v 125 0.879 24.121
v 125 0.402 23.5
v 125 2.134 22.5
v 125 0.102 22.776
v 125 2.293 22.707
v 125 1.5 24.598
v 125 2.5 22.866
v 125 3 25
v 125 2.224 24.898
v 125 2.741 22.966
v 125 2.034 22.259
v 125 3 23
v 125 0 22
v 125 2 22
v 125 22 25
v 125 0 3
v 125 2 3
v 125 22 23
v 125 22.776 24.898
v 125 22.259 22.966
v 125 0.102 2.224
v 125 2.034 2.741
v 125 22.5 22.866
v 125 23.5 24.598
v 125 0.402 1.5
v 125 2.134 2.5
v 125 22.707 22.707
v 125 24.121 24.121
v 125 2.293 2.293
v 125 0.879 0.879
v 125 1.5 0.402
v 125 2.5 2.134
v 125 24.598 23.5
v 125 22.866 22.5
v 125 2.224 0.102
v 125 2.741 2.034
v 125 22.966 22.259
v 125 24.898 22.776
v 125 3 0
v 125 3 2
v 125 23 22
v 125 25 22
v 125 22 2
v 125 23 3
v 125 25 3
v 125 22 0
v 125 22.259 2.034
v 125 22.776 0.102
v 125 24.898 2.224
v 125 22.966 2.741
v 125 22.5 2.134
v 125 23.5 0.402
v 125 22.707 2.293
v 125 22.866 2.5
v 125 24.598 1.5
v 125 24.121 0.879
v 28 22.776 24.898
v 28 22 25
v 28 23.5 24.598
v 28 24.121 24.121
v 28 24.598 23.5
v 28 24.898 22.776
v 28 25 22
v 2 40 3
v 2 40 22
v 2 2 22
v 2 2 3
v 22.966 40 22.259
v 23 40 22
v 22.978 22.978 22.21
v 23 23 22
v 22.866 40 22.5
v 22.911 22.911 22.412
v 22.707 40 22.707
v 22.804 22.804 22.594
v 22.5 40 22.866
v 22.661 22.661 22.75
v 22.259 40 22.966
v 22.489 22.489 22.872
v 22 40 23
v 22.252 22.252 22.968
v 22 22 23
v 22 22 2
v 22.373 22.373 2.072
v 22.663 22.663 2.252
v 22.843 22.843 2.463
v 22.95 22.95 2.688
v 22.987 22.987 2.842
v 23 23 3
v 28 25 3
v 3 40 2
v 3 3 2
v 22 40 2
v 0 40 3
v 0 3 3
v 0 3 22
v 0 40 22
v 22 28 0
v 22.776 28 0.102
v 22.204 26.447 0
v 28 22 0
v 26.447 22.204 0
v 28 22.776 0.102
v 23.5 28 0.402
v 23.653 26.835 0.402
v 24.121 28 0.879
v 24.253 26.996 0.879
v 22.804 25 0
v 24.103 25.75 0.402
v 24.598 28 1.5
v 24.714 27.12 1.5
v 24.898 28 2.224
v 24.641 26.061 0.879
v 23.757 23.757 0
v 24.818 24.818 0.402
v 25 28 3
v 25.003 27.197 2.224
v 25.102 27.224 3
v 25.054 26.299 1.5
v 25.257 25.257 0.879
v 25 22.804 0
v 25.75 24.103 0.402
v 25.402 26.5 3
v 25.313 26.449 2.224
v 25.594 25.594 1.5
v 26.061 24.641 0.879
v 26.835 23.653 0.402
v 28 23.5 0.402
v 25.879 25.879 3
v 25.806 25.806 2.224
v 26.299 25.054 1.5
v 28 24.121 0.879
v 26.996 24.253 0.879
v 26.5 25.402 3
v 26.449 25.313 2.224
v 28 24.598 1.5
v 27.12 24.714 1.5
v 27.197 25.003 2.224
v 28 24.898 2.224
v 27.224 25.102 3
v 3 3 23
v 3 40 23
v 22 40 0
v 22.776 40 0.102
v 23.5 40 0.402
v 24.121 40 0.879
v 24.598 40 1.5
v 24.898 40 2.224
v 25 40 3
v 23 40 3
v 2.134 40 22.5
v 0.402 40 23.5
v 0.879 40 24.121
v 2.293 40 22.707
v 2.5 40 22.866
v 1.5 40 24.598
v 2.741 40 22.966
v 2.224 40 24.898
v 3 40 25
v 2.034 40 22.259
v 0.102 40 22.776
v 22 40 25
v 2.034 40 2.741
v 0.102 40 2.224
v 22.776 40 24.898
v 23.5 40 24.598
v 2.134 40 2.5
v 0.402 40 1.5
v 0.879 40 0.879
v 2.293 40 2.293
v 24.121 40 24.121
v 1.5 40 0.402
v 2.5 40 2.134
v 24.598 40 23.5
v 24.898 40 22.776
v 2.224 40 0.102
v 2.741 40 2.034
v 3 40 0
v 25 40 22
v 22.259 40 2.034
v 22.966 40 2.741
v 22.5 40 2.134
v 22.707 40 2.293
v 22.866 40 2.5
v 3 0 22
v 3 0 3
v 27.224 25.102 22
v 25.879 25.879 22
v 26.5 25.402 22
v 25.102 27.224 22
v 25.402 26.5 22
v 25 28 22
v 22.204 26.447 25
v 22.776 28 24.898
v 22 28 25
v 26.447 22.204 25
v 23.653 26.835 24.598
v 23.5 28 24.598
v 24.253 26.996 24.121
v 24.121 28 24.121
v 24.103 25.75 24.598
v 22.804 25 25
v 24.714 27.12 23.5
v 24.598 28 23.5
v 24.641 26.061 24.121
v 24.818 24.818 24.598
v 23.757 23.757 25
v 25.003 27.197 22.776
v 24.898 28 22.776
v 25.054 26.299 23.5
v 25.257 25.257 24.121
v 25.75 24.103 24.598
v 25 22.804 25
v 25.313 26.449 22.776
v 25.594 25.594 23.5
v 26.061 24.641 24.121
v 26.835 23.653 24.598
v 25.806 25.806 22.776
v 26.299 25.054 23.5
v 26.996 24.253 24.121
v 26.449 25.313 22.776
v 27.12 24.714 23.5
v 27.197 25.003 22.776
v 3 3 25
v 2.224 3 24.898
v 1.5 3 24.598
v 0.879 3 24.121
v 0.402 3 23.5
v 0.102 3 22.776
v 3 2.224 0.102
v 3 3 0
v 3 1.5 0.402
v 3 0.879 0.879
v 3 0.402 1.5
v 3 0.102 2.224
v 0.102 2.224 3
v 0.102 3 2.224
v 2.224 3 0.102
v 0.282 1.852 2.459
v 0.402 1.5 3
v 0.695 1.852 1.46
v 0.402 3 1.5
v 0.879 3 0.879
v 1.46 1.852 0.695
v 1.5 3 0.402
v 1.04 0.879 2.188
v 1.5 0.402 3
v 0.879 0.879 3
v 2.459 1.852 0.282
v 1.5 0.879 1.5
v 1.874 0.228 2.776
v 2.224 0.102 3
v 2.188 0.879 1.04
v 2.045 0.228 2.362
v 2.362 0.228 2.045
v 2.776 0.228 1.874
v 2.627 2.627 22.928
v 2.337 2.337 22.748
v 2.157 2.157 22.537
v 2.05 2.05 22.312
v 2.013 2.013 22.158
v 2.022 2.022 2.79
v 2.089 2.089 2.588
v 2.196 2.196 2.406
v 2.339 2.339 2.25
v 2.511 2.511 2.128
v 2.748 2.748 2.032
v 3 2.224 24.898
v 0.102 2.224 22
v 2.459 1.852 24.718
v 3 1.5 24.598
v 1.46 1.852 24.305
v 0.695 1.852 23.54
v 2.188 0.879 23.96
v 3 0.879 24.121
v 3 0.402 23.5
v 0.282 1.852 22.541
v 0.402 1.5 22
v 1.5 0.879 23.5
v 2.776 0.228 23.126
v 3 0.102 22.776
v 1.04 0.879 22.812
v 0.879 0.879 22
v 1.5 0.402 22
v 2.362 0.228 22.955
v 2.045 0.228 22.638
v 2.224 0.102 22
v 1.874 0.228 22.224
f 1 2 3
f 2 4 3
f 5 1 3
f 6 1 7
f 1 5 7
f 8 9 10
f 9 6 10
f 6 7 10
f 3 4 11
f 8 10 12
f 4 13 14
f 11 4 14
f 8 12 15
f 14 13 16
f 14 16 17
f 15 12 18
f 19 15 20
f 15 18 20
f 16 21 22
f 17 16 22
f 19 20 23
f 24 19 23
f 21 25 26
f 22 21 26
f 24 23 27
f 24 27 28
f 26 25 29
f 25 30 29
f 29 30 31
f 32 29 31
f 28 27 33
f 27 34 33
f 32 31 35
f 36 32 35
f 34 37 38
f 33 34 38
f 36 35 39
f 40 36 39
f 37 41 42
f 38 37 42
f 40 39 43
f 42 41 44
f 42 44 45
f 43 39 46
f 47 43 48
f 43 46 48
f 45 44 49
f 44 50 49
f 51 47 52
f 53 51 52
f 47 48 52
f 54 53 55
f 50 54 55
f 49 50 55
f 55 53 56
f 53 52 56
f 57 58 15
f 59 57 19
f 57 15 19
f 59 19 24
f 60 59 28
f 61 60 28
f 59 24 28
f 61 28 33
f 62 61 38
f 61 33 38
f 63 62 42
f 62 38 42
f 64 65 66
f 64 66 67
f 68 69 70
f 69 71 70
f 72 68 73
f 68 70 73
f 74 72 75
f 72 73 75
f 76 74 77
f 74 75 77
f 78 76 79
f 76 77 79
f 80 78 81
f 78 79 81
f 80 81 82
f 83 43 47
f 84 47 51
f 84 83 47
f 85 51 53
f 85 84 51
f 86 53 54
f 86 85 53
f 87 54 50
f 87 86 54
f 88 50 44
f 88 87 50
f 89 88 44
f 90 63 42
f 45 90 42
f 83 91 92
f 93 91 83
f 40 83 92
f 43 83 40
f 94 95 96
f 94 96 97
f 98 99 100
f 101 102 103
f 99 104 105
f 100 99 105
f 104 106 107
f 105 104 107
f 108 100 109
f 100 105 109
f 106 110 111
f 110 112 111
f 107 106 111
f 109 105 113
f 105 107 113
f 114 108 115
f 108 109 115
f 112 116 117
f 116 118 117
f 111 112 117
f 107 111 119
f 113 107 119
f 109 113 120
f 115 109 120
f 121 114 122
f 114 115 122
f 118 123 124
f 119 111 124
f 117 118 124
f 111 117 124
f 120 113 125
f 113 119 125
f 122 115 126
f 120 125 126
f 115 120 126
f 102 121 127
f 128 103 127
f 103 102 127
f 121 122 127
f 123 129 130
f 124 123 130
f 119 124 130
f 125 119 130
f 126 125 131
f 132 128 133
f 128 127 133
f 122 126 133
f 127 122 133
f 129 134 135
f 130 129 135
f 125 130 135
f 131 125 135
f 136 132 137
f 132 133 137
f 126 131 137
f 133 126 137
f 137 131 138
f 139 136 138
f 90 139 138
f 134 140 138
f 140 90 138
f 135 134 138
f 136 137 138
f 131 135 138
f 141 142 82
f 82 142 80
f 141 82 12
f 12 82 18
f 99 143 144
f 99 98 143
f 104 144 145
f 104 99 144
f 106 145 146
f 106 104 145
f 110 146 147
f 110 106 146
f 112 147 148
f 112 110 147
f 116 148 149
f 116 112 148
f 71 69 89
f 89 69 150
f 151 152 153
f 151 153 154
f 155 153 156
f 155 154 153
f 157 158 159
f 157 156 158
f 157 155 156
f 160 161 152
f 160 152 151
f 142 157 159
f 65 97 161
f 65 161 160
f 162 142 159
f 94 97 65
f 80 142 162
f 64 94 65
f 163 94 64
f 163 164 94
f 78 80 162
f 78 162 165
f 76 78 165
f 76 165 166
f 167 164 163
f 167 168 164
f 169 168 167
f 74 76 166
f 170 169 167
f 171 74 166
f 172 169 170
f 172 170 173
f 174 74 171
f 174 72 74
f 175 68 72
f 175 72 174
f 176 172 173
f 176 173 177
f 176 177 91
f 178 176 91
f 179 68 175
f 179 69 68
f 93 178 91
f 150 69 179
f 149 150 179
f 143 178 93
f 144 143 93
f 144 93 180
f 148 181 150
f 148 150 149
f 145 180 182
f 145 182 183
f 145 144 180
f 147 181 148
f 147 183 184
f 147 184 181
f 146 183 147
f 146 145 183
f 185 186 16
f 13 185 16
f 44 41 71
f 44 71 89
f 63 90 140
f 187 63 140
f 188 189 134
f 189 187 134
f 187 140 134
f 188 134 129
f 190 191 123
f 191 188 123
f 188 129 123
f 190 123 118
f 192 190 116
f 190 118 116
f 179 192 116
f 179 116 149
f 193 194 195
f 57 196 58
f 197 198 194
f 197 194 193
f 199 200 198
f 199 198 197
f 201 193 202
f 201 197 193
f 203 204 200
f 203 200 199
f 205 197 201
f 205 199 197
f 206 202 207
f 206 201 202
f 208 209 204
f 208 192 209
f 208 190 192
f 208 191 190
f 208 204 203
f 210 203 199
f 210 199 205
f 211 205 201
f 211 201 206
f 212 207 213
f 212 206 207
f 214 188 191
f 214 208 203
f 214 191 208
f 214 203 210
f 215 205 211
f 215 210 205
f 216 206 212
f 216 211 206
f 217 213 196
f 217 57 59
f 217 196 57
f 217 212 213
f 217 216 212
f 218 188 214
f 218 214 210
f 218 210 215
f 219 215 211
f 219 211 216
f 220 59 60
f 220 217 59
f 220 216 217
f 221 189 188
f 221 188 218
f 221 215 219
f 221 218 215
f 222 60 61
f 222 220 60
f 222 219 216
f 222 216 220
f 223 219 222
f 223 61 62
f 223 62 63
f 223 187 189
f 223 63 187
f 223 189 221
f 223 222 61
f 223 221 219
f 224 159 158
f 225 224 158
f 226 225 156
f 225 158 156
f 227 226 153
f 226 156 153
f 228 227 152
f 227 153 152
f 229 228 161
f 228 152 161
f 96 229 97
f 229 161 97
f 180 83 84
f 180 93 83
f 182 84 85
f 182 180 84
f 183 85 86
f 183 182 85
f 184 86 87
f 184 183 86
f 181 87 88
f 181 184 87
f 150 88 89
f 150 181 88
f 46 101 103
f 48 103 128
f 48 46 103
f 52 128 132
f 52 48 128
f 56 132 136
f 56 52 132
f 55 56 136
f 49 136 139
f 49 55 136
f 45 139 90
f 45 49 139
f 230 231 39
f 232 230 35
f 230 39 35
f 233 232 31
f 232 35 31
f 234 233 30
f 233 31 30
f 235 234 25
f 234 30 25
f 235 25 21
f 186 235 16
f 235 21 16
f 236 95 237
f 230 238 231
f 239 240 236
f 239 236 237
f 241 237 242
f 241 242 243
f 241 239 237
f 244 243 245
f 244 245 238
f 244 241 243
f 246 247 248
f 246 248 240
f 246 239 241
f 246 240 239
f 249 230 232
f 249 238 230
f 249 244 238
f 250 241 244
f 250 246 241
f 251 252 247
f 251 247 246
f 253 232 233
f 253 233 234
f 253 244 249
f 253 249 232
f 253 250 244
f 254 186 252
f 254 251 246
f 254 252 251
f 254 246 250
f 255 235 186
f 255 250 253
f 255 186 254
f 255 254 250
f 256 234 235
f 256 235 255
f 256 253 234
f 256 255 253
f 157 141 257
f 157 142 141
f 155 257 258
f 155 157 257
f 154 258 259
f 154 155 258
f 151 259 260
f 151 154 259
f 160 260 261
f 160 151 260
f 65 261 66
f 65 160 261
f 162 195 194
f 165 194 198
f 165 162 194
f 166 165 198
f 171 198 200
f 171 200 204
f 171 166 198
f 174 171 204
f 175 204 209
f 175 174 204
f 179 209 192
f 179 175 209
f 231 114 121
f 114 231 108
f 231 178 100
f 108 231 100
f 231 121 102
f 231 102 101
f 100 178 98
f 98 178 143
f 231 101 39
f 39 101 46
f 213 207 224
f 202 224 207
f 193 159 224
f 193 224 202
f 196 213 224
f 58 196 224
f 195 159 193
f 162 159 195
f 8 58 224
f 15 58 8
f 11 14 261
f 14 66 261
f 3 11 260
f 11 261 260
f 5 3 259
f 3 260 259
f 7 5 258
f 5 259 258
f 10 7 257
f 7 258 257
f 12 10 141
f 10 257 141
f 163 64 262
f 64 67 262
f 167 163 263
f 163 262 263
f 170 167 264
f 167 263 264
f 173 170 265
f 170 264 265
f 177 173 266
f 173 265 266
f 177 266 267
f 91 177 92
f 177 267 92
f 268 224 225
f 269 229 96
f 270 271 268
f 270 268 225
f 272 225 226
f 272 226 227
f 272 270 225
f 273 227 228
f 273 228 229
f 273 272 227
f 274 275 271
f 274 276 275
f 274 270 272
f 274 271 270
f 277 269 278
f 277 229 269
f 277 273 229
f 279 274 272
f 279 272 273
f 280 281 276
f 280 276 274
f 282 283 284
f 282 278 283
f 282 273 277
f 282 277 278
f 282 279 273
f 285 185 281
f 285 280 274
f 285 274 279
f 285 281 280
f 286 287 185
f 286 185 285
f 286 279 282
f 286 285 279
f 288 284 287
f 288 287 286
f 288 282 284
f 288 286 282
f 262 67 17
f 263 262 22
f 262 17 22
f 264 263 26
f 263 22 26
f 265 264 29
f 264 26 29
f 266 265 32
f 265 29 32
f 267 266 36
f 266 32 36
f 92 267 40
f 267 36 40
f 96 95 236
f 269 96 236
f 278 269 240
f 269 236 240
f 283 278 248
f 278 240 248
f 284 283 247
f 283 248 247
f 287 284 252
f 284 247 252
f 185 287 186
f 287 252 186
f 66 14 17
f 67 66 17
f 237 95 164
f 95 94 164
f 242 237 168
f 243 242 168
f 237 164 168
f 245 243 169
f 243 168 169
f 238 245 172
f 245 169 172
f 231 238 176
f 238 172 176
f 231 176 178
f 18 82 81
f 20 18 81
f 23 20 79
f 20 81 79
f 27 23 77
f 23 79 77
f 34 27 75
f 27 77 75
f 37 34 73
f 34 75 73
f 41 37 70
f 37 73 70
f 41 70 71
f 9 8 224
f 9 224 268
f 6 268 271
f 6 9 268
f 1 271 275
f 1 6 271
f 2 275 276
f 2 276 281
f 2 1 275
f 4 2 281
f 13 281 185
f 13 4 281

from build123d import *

# Parameters (mm, degrees)
SKETCH1_W           = 125
SKETCH1_H           = 40
BOSS_EXTRUDE1_DEPTH = 25
SKETCH2_W           = 100
SKETCH2_H           = 15
CUT_EXTRUDE1_DEPTH  = 25
SKETCH3_W           = 21
SKETCH3_H           = 21
CUT_EXTRUDE2_DEPTH  = 123
SKETCH4_W           = 21
SKETCH4_H           = 21
CUT_EXTRUDE3_DEPTH  = 38
FILLET3_R           = 1
FILLET4_R           = 1
FILLET5_R           = 1
FILLET6_R           = 1
FILLET7_R           = 1
FILLET8_R           = 1
FILLET9_R           = 3
FILLET11_R          = 3
FILLET12_R          = 3


with BuildPart() as part:
    # Sketch1 → Boss-Extrude1 (new body)
    with BuildSketch(Plane.XY):
        with Locations((62.5, 20)):
            Rectangle(SKETCH1_W, SKETCH1_H)
    extrude(amount=BOSS_EXTRUDE1_DEPTH)

    # Sketch2 → Cut-Extrude1 (cut)
    with BuildSketch(Plane.XY.offset(25)):
        with Locations((75, 32.5)):
            Rectangle(SKETCH2_W, SKETCH2_H)
    extrude(amount=-CUT_EXTRUDE1_DEPTH, mode=Mode.SUBTRACT)

    # Sketch3 → Cut-Extrude2 (cut)
    with BuildSketch(Plane(origin=(125, 0, 0), x_dir=(0, 0, -1), z_dir=(1, 0, 0))):
        with Locations((-12.5, 12.5)):
            Rectangle(SKETCH3_W, SKETCH3_H)
    extrude(amount=-CUT_EXTRUDE2_DEPTH, mode=Mode.SUBTRACT)

    # Sketch4 → Cut-Extrude3 (cut)
    with BuildSketch(Plane(origin=(0, 40, 0), x_dir=(1, 0, 0), z_dir=(0, 1, 0))):
        with Locations((12.5, -12.5)):
            Rectangle(SKETCH4_W, SKETCH4_H)
    extrude(amount=-CUT_EXTRUDE3_DEPTH, mode=Mode.SUBTRACT)

    # Fillet3
    fillet3_edges = [part.edges().sort_by_distance(p)[0] for p in [
        (2, 21, 2),
        (63.5, 2, 2),
    ]]
    fillet(fillet3_edges, radius=FILLET3_R)

    # Fillet4
    fillet4_edges = [part.edges().sort_by_distance(p)[0] for p in [
        (2, 21, 23),
        (63.5, 2, 23),
    ]]
    fillet(fillet4_edges, radius=FILLET4_R)

    # Fillet5
    fillet5_edges = [part.edges().sort_by_distance(p)[0] for p in [
        (74, 23, 2),
    ]]
    fillet(fillet5_edges, radius=FILLET5_R)

    # Fillet6
    fillet6_edges = [part.edges().sort_by_distance(p)[0] for p in [
        (74, 23, 23),
    ]]
    fillet(fillet6_edges, radius=FILLET6_R)

    # Fillet7
    fillet7_edges = [part.edges().sort_by_distance(p)[0] for p in [
        (23, 31, 23),
    ]]
    fillet(fillet7_edges, radius=FILLET7_R)

    # Fillet8
    fillet8_edges = [part.edges().sort_by_distance(p)[0] for p in [
        (23, 31, 2),
    ]]
    fillet(fillet8_edges, radius=FILLET8_R)

    # Fillet9
    fillet9_edges = [part.edges().sort_by_distance(p)[0] for p in [
        (25, 25, 12.5),
        (25, 32.5, 25),
        (75, 25, 25),
        (0, 20, 25),
        (62.5, 0, 25),
    ]]
    fillet(fillet9_edges, radius=FILLET9_R)

    # Fillet11
    fillet11_edges = [part.edges().sort_by_distance(p)[0] for p in [
        (76.5, 25, 0),
        (25.878679656, 25.878679656, 0),
        (25, 34, 0),
        (62.5, 0, 0),
        (0, 20, 0),
    ]]
    fillet(fillet11_edges, radius=FILLET11_R)

    # Fillet12
    # the kernel refuses this fillet: 3 mm, written as the material it takes off along each edge
    with BuildSketch(Plane(origin=(3, 3, 22), x_dir=(-1, 0, 0), z_dir=(0, -1, 0))) as fillet12_piece_1_section:
        Polygon((0, 0), (FILLET12_R, 0), (FILLET12_R, -FILLET12_R), (0, -FILLET12_R), align=None)
    fillet12_piece_1 = extrude(amount=FILLET12_R, mode=Mode.PRIVATE)
    fillet12_piece_1 = fillet12_piece_1 - Plane(origin=(3, 3, 22), x_dir=(0.7071067811865475, 0, -0.7071067811865475), z_dir=(0, -1, 0)) * Sphere(FILLET12_R, mode=Mode.PRIVATE)
    add(fillet12_piece_1, mode=Mode.SUBTRACT)
    with BuildSketch(Plane(origin=(3, 3, 3), x_dir=(-1, 0, 0), z_dir=(0, -1, 0))) as fillet12_piece_2_section:
        Polygon((0, 0), (FILLET12_R, 0), (FILLET12_R, FILLET12_R), (0, FILLET12_R), align=None)
    fillet12_piece_2 = extrude(amount=FILLET12_R, mode=Mode.PRIVATE)
    fillet12_piece_2 = fillet12_piece_2 - Plane(origin=(3, 3, 3), x_dir=(0.7071067811865475, 0, 0.7071067811865475), z_dir=(0, -1, 0)) * Sphere(FILLET12_R, mode=Mode.PRIVATE)
    add(fillet12_piece_2, mode=Mode.SUBTRACT)
    with BuildSketch(Plane(origin=(0, 0, 3), x_dir=(1, 0, 0), z_dir=(0, 0, 1))) as fillet12_piece_3:
        with BuildLine():
            CenterArc((FILLET12_R, FILLET12_R), FILLET12_R, 180, 90)
            Line((0, FILLET12_R), (0, 0))
            Line((0, 0), (FILLET12_R, 0))
        make_face()
    extrude(amount=19, mode=Mode.SUBTRACT)


solid = part.part
